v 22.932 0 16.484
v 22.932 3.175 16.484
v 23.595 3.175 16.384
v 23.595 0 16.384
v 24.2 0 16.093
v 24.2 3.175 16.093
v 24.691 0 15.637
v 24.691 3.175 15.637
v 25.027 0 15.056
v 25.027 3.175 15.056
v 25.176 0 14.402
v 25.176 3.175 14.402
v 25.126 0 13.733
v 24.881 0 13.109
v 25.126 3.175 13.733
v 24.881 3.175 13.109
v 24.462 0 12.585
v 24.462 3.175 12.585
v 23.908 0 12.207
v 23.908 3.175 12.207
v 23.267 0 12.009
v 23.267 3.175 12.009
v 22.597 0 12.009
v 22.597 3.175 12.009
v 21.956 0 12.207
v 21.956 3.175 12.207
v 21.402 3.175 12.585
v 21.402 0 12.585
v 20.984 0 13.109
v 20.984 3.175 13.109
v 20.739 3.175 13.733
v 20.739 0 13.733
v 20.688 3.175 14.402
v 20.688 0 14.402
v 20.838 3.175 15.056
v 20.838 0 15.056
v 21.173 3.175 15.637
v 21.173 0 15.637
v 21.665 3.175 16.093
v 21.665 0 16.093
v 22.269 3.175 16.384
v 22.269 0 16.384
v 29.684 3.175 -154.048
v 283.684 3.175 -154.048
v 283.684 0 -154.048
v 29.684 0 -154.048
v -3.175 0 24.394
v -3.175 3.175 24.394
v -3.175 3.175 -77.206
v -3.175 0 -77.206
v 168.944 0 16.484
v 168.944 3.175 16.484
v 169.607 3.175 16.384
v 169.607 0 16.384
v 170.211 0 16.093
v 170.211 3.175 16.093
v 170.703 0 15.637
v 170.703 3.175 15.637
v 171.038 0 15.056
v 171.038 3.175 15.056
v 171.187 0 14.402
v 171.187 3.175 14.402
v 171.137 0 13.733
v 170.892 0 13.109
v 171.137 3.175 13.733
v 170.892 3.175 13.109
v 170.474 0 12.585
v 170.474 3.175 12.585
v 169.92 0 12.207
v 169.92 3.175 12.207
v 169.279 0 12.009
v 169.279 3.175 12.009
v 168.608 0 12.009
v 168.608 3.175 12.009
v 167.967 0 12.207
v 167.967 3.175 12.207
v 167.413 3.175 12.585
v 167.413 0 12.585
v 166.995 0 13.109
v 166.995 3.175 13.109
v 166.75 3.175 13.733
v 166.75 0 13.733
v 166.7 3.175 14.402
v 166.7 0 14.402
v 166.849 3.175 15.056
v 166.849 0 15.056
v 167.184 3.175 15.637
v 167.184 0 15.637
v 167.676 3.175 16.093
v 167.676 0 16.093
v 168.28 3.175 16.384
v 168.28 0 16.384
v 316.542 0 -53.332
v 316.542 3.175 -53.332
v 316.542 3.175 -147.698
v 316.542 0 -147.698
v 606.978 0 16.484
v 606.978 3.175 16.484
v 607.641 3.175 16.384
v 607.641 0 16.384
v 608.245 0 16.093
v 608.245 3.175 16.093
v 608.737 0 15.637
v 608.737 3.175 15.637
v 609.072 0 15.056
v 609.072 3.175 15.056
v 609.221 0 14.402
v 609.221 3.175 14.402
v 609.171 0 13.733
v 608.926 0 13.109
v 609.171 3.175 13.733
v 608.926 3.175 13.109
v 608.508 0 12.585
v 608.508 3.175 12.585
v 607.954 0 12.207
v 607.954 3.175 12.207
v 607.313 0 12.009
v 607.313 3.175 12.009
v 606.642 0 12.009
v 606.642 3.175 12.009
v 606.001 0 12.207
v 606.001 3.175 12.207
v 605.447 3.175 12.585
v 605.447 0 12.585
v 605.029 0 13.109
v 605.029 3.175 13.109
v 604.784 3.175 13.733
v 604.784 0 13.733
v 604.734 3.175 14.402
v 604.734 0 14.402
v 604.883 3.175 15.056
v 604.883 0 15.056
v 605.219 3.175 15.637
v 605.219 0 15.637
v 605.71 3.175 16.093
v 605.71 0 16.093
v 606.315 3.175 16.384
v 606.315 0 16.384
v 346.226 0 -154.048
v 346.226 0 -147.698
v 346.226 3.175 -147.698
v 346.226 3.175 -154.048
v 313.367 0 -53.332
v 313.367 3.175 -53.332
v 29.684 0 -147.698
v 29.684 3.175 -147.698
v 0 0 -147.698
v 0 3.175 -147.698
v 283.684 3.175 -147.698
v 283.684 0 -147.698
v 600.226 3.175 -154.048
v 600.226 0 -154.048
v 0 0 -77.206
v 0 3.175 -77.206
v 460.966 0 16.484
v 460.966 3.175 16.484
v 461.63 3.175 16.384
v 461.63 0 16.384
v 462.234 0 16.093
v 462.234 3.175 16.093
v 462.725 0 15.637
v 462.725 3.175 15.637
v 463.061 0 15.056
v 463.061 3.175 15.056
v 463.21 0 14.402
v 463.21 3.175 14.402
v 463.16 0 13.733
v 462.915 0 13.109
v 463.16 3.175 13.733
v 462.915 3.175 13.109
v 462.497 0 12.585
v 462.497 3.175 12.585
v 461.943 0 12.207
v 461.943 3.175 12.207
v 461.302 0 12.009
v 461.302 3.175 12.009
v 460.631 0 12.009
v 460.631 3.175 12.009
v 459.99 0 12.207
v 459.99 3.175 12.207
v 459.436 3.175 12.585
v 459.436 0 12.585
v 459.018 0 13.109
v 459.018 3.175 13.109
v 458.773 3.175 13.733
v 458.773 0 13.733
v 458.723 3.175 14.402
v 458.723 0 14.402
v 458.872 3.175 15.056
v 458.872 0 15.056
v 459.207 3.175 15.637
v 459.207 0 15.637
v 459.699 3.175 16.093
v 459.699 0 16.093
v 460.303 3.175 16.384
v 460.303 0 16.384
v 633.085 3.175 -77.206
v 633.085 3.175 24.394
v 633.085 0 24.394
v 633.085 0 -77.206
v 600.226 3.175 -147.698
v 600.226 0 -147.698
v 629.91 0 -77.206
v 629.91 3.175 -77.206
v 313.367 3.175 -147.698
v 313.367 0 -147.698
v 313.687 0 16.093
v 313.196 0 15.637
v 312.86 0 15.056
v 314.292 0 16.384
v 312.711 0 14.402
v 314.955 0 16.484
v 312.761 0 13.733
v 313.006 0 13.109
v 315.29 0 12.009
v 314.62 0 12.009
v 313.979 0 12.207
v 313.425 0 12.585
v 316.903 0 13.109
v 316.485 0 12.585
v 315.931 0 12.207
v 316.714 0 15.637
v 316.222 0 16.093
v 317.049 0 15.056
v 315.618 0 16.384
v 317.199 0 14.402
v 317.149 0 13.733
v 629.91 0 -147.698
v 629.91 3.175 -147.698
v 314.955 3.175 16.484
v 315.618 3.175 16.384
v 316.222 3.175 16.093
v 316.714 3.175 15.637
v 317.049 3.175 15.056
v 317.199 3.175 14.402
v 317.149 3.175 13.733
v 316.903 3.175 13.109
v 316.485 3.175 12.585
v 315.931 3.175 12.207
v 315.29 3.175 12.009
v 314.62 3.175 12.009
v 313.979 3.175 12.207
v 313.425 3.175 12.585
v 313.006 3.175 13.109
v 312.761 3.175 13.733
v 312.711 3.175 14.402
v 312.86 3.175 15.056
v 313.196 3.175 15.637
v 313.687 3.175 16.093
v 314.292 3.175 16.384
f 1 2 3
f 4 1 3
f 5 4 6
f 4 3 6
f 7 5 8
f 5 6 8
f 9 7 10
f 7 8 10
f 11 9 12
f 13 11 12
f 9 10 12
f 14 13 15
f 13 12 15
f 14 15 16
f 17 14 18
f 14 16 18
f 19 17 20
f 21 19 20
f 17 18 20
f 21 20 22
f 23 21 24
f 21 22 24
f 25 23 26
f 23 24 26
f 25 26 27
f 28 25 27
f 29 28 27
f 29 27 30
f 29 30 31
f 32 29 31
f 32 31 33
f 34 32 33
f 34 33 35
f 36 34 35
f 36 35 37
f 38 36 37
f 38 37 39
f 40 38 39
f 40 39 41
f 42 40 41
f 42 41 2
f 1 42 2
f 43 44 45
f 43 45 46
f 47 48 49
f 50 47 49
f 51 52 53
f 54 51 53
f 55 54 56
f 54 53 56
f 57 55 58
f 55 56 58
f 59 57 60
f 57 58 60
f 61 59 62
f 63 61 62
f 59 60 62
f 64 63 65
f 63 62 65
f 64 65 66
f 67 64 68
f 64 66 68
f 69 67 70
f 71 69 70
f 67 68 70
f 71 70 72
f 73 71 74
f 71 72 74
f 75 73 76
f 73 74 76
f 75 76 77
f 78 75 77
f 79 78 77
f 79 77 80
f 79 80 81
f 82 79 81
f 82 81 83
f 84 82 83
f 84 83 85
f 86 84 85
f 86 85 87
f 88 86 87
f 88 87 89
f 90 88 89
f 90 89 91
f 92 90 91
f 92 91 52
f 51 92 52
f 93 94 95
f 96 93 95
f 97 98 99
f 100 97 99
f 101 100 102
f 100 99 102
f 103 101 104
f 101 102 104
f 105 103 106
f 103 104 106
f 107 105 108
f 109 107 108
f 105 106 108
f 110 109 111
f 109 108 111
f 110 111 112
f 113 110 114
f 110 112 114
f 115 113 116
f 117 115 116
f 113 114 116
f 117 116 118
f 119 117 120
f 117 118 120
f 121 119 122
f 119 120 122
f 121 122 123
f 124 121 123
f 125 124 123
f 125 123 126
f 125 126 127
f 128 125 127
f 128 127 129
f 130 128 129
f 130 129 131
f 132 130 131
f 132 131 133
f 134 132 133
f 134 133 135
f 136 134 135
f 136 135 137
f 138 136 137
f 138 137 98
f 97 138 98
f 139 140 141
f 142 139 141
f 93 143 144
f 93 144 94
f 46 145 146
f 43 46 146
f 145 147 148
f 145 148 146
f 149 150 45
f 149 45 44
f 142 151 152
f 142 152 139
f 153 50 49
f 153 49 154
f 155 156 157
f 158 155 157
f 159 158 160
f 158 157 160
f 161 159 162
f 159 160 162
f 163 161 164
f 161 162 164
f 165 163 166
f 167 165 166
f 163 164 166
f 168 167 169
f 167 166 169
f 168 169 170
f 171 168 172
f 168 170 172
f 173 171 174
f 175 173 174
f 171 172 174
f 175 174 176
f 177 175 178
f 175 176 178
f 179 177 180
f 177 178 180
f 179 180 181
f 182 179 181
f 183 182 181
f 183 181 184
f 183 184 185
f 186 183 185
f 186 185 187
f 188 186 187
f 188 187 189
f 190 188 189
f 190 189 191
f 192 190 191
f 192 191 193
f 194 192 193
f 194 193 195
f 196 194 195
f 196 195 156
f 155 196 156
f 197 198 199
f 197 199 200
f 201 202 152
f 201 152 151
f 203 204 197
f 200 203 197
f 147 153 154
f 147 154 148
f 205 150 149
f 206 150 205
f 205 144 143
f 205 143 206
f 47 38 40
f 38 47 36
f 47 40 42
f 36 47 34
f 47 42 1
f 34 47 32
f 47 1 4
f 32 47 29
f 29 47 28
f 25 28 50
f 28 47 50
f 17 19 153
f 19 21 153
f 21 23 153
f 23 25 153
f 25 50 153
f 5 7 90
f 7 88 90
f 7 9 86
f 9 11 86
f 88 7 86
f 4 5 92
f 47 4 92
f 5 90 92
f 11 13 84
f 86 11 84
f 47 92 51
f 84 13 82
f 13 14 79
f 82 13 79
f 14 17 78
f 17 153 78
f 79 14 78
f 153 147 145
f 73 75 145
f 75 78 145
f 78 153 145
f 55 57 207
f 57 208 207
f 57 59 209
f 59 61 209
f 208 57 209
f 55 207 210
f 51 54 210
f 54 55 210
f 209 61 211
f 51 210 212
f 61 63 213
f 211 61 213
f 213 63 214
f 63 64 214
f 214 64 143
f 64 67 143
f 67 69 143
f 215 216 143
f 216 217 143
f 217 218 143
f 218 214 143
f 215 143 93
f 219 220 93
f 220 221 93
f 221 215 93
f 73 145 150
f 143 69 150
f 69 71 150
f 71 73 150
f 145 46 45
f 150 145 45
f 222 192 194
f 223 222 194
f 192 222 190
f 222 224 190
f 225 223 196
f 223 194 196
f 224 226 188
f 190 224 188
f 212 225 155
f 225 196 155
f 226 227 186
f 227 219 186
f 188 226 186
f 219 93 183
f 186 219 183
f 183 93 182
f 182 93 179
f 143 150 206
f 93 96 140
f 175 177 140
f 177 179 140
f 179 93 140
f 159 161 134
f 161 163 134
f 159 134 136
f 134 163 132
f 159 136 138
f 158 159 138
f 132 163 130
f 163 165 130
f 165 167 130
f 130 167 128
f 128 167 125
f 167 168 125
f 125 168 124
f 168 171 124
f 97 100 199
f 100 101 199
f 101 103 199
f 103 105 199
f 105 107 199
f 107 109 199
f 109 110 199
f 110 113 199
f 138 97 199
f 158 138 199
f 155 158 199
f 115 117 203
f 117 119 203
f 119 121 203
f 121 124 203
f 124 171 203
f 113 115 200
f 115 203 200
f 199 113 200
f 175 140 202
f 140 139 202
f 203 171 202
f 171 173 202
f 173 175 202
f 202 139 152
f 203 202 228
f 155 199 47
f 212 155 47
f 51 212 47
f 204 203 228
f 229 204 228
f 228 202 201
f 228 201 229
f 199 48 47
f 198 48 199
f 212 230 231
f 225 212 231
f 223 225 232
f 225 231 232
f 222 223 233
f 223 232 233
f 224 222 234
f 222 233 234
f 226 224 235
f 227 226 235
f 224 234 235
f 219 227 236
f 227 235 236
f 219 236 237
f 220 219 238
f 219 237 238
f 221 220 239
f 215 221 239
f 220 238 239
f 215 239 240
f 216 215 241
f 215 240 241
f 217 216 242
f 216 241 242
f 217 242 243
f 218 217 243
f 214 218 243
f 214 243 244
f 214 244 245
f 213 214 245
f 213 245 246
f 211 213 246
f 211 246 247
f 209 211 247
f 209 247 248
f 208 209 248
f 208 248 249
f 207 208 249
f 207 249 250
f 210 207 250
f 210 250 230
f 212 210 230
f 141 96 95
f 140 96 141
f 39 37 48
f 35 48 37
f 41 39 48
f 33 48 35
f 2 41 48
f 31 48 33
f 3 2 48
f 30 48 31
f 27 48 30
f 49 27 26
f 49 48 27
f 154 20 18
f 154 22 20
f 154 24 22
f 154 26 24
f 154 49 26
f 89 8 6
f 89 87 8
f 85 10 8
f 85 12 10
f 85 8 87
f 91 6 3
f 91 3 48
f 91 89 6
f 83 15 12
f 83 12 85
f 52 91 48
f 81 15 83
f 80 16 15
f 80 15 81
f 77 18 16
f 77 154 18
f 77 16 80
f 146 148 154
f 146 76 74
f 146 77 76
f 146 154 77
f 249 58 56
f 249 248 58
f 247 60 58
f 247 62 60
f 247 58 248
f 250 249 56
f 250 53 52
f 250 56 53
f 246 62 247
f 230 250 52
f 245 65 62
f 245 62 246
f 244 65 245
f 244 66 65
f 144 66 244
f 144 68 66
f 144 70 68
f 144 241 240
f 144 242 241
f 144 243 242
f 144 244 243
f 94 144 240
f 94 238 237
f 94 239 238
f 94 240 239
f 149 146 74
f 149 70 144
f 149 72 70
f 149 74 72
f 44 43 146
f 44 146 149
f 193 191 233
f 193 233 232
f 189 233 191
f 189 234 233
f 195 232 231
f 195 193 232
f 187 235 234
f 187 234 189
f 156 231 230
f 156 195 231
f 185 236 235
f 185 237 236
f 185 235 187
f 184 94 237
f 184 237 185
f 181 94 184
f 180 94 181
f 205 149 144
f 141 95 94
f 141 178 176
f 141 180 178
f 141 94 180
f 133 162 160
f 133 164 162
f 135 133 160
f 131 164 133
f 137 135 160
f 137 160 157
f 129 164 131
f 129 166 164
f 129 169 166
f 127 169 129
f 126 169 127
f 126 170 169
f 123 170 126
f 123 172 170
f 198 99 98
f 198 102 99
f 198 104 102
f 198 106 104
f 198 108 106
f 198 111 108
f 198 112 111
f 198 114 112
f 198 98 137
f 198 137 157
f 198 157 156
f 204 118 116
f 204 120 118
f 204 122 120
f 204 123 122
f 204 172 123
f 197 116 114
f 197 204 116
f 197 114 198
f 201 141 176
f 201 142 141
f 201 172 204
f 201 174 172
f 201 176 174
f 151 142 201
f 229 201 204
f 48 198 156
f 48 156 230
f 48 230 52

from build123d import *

# Parameters (mm, degrees)
SKETCH1_W           = 629.90984
SKETCH1_H           = 147.69846
BOSS_EXTRUDE1_DEPTH = 3.175
SKETCH3_W           = 254
SKETCH3_H           = 3.175
BOSS_EXTRUDE2_DEPTH = 6.35
SKETCH4_W           = 3.175
SKETCH4_H           = 188.732840052
CUT_EXTRUDE1_DEPTH  = 3.175
SKETCH9_W           = 3.175
SKETCH9_H           = 77.20584
BOSS_EXTRUDE4_DEPTH = 3.175
SKETCH10_W          = 636.25984
SKETCH10_H          = 24.39416
BOSS_EXTRUDE5_DEPTH = 3.175
SKETCH13_R          = 2.25
CUT_EXTRUDE3_DEPTH  = 652.56536379


with BuildPart() as part:
    # Sketch1 → Boss-Extrude1 (new body)
    with BuildSketch(Plane(origin=(0, 0, 0), x_dir=(1, 0, 0), z_dir=(0, 1, 0))):
        with Locations((314.95492, 73.84923)):
            Rectangle(SKETCH1_W, SKETCH1_H)
    extrude(amount=BOSS_EXTRUDE1_DEPTH)

    # Sketch3 → Boss-Extrude2 (add)
    with BuildSketch(Plane(origin=(0, 0, -147.69846), x_dir=(-1, 0, 0), z_dir=(0, 0, -1))):
        with Locations((-473.22613, 1.5875)):
            Rectangle(SKETCH3_W, SKETCH3_H)
        with Locations((-156.68371, 1.5875)):
            Rectangle(SKETCH3_W, SKETCH3_H)
    extrude(amount=BOSS_EXTRUDE2_DEPTH)

    # Sketch4 → Cut-Extrude1 (cut)
    with BuildSketch(Plane(origin=(0, 3.175, 0), x_dir=(1, 0, 0), z_dir=(0, 1, 0))):
        with Locations((314.95492, 147.69846)):
            Rectangle(SKETCH4_W, SKETCH4_H)
    extrude(amount=-CUT_EXTRUDE1_DEPTH, mode=Mode.SUBTRACT)

    # Sketch9 → Boss-Extrude4 (add, through all)
    with BuildSketch(Plane.XZ):
        with Locations((-1.5875, -38.60292)):
            Rectangle(SKETCH9_W, SKETCH9_H)
        with Locations((631.49734, -38.60292)):
            Rectangle(SKETCH9_W, SKETCH9_H)
    extrude(amount=-BOSS_EXTRUDE4_DEPTH)

    # Sketch10 → Boss-Extrude5 (add, through all)
    with BuildSketch(Plane(origin=(0, 3.175, 0), x_dir=(1, 0, 0), z_dir=(0, 1, 0))):
        with Locations((314.95492, -12.19708)):
            Rectangle(SKETCH10_W, SKETCH10_H)
    extrude(amount=-BOSS_EXTRUDE5_DEPTH)

    # Sketch13 → Cut-Extrude3 (cut, through all)
    with BuildSketch(Plane(origin=(0, 3.175, 0), x_dir=(1, 0, 0), z_dir=(0, 1, 0))):
        with Locations(Location((606.977733219, -14.23416, 0), (0, 0, 270))):
            Circle(SKETCH13_R)
        with Locations(Location((460.966326609, -14.23416, 0), (0, 0, 270))):
            Circle(SKETCH13_R)
        with Locations(Location((314.95492, -14.23416, 0), (0, 0, 270))):
            Circle(SKETCH13_R)
        with Locations(Location((168.943513391, -14.23416, 0), (0, 0, 270))):
            Circle(SKETCH13_R)
        with Locations(Location((22.932106781, -14.23416, 0), (0, 0, 270))):
            Circle(SKETCH13_R)
    extrude(amount=-CUT_EXTRUDE3_DEPTH, mode=Mode.SUBTRACT)


solid = part.part
